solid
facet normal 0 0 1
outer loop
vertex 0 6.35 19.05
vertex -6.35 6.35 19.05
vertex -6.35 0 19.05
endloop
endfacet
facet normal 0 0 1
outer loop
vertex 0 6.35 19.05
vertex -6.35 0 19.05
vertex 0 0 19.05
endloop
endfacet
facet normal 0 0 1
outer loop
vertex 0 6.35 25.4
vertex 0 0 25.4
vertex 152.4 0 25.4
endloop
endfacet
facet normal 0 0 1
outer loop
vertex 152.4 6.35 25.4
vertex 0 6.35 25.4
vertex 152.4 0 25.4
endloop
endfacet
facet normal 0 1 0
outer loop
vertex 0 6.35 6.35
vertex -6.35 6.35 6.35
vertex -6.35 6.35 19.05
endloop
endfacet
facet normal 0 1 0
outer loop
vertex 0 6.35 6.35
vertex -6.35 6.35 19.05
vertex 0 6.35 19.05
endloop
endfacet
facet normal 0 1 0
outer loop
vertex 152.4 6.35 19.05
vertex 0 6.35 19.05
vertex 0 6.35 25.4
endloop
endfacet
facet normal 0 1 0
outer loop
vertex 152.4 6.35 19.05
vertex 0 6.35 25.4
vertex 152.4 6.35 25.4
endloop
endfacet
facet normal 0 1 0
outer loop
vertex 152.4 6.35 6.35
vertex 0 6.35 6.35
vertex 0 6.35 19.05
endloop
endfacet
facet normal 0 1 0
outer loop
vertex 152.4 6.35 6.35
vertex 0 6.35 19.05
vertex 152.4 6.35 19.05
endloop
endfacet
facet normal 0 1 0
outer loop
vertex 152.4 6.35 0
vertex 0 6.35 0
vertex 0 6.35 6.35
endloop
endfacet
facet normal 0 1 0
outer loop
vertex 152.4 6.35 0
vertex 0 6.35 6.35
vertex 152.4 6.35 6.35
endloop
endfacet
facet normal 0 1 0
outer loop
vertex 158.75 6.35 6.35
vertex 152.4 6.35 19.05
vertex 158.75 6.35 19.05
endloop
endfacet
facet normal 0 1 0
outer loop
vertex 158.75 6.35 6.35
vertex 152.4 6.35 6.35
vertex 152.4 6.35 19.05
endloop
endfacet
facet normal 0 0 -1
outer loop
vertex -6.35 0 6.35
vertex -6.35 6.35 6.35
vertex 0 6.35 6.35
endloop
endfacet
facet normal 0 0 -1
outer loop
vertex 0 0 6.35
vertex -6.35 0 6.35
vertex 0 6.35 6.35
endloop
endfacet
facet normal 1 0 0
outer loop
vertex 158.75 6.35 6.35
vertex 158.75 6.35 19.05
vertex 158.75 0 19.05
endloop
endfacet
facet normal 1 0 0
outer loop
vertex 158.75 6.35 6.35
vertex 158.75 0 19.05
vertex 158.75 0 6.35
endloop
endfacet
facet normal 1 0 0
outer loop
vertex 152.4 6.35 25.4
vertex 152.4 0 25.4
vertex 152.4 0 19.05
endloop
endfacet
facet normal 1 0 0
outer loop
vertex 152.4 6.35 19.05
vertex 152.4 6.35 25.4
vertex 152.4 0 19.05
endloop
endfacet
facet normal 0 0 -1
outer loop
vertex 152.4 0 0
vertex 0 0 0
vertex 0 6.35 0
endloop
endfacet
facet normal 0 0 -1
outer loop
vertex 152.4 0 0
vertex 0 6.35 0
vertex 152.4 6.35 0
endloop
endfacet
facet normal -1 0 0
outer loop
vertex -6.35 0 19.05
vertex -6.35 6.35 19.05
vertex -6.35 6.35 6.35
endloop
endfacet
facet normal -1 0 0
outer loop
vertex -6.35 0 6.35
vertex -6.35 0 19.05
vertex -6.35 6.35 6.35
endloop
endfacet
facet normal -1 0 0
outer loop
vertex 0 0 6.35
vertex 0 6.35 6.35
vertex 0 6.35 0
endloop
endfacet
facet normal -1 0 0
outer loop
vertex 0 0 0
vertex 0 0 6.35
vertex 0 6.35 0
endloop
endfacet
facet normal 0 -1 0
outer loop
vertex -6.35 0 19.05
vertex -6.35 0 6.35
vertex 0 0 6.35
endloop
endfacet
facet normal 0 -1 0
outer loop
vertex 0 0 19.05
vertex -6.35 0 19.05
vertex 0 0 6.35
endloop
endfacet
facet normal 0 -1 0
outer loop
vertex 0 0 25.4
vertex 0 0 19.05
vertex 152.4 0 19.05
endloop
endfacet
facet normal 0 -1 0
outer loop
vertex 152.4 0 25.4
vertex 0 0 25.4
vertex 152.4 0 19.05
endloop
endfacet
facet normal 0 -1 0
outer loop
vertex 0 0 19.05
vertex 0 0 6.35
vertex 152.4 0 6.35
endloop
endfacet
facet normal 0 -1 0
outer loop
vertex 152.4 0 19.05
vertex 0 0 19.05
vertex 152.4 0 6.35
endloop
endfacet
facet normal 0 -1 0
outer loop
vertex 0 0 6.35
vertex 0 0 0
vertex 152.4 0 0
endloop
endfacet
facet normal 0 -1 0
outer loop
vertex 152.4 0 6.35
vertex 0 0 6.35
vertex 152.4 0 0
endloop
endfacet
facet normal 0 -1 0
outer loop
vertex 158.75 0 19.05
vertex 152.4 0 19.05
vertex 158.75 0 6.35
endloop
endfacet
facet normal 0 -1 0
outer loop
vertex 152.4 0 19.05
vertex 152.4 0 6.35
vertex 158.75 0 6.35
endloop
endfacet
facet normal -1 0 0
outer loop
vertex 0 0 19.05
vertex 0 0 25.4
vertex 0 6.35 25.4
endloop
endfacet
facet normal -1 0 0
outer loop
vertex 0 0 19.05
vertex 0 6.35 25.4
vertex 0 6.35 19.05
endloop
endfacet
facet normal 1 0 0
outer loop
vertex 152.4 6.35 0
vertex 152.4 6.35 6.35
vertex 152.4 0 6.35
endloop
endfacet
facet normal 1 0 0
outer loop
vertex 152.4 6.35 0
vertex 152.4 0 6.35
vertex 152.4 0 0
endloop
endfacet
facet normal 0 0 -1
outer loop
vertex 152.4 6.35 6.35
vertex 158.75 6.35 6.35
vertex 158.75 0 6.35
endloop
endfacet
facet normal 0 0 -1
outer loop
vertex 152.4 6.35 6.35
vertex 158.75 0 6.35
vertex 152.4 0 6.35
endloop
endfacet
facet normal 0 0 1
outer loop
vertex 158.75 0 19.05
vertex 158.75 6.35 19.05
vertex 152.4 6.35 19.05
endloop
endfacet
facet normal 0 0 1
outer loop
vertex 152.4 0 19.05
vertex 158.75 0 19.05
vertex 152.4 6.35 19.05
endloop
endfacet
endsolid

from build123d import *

# Parameters (mm, degrees)
SKETCH1_W           = 152.4
SKETCH1_H           = 25.4
BOSS_EXTRUDE1_DEPTH = 6.35
SKETCH3_W           = 6.35
SKETCH3_H           = 12.7
BOSS_EXTRUDE2_DEPTH = 6.35


with BuildPart() as part:
    # Sketch1 → Boss-Extrude1 (new body)
    with BuildSketch(Plane(origin=(0, 0, 0), x_dir=(1, 0, 0), z_dir=(0, 1, 0))):
        with Locations((76.2, -12.7)):
            Rectangle(SKETCH1_W, SKETCH1_H)
    extrude(amount=BOSS_EXTRUDE1_DEPTH)

    # Sketch3 → Boss-Extrude2 (add)
    with BuildSketch(Plane(origin=(0, 6.35, 0), x_dir=(1, 0, 0), z_dir=(0, 1, 0))):
        with Locations((-3.175, -12.7)):
            Rectangle(SKETCH3_W, SKETCH3_H)
    boss_extrude2 = extrude(amount=-BOSS_EXTRUDE2_DEPTH)

    # Mirror1: Boss-Extrude2 across plane
    add(boss_extrude2.mirror(Plane.ZY.offset(-76.2)))


solid = part.part
